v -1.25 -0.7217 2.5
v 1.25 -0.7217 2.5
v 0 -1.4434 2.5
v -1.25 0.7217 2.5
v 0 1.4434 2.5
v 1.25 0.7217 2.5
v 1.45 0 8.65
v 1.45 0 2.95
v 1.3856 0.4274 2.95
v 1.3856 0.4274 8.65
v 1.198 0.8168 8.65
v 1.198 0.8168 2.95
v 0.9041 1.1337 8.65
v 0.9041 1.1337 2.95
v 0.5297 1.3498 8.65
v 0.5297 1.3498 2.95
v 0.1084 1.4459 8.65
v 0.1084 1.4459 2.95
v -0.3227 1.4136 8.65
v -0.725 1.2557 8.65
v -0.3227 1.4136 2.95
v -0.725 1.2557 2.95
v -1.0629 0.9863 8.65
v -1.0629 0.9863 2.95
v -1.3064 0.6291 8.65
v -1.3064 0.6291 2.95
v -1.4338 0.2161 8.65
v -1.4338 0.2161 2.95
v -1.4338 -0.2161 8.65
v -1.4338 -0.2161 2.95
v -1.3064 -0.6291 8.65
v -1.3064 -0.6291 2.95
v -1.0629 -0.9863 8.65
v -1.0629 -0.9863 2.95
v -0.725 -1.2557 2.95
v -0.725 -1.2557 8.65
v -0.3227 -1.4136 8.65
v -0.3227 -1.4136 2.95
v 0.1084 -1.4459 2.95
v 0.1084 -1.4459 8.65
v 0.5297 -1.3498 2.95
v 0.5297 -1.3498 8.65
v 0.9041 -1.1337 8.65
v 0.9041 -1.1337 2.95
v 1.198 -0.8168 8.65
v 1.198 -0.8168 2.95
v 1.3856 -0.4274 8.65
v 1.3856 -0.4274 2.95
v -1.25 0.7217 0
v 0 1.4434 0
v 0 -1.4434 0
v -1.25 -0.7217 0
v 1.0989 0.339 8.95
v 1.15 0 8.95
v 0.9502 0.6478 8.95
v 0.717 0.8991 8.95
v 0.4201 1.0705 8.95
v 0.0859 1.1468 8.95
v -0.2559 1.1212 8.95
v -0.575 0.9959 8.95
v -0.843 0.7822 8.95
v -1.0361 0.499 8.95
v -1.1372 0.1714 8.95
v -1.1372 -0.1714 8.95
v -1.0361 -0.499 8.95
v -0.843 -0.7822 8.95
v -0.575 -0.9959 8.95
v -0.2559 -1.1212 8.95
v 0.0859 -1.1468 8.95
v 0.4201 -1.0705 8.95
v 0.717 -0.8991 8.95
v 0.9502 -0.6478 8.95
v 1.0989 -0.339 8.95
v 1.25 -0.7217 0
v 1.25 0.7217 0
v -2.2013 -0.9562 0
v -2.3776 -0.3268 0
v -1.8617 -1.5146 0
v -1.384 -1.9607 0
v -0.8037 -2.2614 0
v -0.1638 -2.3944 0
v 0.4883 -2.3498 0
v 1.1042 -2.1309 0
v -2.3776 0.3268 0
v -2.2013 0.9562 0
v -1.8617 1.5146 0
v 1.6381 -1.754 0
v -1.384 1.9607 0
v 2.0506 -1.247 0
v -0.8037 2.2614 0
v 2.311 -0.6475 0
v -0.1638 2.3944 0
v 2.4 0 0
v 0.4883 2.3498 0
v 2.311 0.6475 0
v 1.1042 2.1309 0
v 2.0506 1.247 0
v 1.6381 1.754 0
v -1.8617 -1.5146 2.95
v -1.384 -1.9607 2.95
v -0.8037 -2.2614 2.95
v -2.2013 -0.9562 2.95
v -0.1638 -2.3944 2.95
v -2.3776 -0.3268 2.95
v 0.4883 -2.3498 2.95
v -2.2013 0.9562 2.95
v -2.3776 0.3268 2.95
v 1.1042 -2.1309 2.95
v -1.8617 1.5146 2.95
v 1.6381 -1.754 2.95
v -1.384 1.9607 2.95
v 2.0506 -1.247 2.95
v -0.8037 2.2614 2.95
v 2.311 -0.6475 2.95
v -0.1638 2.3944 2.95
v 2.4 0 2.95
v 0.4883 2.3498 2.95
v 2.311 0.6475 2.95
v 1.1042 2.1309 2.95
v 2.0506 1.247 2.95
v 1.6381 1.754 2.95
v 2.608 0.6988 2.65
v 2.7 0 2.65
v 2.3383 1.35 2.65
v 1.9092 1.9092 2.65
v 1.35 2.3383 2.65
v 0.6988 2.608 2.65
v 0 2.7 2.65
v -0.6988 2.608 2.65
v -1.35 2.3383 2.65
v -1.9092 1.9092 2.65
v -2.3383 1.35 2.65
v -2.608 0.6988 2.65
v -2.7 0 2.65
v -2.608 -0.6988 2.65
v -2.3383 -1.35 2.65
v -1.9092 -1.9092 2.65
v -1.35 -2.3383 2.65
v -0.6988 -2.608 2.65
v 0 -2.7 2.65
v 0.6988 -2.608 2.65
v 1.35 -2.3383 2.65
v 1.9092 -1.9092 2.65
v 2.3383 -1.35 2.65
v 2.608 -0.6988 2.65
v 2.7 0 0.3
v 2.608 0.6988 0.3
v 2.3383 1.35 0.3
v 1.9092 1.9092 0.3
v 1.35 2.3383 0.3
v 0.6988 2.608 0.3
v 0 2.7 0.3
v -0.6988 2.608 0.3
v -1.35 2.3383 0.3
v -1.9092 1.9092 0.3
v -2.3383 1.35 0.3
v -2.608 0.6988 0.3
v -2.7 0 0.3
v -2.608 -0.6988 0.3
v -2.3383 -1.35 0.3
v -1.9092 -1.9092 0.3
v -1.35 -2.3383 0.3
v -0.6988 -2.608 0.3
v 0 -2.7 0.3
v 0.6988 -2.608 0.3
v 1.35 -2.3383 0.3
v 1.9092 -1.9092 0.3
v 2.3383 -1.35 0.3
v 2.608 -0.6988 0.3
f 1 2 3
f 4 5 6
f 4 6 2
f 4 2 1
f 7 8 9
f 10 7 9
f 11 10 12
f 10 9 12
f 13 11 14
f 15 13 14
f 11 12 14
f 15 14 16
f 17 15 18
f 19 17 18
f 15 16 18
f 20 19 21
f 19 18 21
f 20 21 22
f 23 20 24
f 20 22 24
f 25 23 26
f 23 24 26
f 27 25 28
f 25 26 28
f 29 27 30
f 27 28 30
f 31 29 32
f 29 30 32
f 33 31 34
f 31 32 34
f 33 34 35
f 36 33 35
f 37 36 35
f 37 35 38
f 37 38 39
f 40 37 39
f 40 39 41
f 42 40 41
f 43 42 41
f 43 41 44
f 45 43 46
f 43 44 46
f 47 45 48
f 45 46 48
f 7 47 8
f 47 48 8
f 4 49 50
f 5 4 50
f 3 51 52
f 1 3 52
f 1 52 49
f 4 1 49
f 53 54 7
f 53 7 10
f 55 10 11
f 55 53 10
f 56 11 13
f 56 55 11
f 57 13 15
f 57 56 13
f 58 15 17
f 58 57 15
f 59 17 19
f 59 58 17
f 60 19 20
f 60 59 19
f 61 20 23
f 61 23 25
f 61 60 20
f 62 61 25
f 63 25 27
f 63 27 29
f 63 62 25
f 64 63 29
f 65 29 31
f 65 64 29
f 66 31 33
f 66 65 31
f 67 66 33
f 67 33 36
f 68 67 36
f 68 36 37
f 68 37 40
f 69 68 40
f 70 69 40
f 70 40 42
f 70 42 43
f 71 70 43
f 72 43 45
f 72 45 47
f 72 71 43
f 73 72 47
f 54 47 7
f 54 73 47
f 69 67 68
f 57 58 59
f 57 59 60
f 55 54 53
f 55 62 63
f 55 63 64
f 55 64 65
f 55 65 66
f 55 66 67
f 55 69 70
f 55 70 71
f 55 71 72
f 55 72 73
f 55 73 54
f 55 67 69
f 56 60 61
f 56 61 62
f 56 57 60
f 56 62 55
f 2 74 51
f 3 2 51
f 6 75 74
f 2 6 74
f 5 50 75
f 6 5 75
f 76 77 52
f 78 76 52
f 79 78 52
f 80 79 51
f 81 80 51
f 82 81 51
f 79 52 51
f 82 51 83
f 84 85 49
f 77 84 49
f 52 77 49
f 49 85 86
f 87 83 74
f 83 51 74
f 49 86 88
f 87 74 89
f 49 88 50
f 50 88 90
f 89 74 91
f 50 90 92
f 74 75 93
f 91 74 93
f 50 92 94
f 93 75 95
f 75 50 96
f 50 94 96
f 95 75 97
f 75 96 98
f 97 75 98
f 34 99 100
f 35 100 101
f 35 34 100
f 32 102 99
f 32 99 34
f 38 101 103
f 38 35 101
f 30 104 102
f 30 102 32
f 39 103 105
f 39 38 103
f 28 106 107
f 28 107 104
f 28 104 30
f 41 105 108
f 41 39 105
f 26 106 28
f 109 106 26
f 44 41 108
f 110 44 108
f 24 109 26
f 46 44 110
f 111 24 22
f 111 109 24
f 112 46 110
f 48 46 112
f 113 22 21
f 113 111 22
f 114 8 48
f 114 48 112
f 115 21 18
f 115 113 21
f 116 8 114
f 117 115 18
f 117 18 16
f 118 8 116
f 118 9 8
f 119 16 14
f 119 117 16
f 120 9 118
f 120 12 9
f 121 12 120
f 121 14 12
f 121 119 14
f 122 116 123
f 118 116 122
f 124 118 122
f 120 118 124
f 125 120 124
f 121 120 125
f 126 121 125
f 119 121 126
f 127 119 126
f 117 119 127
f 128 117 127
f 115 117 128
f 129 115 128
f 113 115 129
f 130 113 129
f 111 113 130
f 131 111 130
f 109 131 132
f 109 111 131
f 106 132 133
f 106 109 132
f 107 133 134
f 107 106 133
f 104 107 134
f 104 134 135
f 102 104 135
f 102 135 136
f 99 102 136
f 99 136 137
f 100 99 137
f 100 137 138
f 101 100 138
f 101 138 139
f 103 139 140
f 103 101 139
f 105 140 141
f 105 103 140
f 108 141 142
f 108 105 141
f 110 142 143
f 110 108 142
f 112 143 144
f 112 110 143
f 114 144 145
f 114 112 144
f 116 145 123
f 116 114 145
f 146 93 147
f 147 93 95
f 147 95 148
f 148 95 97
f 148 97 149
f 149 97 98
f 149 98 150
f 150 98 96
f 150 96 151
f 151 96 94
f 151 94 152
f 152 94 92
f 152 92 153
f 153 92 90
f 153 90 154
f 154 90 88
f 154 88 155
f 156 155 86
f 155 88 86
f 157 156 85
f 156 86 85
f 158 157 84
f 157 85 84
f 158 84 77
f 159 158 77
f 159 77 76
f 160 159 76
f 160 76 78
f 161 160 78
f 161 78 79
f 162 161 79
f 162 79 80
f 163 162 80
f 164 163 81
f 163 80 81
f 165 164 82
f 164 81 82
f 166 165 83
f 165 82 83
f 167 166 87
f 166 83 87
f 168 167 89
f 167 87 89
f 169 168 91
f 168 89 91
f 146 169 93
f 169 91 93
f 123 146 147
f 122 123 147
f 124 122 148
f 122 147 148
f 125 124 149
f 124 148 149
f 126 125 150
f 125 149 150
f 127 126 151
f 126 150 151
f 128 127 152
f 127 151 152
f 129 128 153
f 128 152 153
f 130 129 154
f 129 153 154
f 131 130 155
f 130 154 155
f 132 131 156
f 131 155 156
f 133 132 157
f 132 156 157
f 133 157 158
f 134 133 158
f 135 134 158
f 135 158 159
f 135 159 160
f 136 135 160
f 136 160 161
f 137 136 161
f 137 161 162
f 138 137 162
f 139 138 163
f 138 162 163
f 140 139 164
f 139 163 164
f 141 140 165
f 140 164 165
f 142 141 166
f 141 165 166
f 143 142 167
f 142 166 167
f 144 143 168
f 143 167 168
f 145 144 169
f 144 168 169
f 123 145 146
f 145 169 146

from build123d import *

# Parameters (mm, degrees)
SKIZZE1_R                       = 2.7
AUFSATZ_LINEAR_AUSTRAGEN1_DEPTH = 2.95
SKIZZE2_R                       = 1.45
AUFSATZ_LINEAR_AUSTRAGEN2_DEPTH = 6
FASE1_SIZE                      = 0.3
SCHNITT_LINEAR_AUSTRAGEN1_DEPTH = 2.5


with BuildPart() as part:
    # Skizze1 → Aufsatz-Linear austragen1 (new body)
    with BuildSketch(Plane.XY):
        Circle(SKIZZE1_R)
    extrude(amount=AUFSATZ_LINEAR_AUSTRAGEN1_DEPTH)

    # Skizze2 → Aufsatz-Linear austragen2 (add)
    with BuildSketch(Plane.XY.offset(2.95)):
        Circle(SKIZZE2_R)
    extrude(amount=AUFSATZ_LINEAR_AUSTRAGEN2_DEPTH)

    # Fase1
    fase1_edges = [part.edges().sort_by_distance(p)[0] for p in [
        (-2.7, 0, 0),
        (-2.7, 0, 2.95),
        (-1.45, 0, 8.95),
    ]]
    chamfer(fase1_edges, length=FASE1_SIZE)

    # Skizze3 → Schnitt-Linear austragen1 (cut)
    with BuildSketch(Plane(origin=(0, 0, 0), x_dir=(-1, 0, 0), z_dir=(0, 0, -1))):
        Polygon((1.25, 0.721687836), (0, 1.443375673), (-1.25, 0.721687836), (-1.25, -0.721687836), (0, -1.443375673), (1.25, -0.721687836), align=None)
    extrude(amount=-SCHNITT_LINEAR_AUSTRAGEN1_DEPTH, mode=Mode.SUBTRACT)


solid = part.part
